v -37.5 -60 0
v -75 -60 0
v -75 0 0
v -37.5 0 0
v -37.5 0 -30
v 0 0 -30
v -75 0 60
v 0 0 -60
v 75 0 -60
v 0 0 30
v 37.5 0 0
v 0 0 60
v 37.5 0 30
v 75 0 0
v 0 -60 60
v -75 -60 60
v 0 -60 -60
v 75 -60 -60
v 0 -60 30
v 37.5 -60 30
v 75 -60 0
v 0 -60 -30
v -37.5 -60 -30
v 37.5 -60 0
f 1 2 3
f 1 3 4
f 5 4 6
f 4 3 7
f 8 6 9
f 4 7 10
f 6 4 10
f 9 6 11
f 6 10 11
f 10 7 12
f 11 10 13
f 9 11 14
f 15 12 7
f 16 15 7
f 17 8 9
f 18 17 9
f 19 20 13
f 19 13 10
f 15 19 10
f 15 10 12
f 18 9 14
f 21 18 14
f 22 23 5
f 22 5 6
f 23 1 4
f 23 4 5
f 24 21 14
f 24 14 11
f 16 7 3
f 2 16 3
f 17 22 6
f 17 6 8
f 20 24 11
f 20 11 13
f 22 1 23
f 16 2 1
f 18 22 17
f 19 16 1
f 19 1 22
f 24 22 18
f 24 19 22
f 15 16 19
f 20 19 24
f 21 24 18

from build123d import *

# Parameters (mm, degrees)
F0_W     = 37.5
F0_H     = 30
F1_DEPTH = 60


with BuildPart() as f1:
    # F0 (on Front) → F1 (new body)
    with BuildSketch(Plane.XZ):
        with Locations((-18.75, -15)):
            Rectangle(F0_W, F0_H)
        with Locations((-18.75, 15)):
            Rectangle(F0_W, F0_H)
        with Locations((18.75, 15)):
            Rectangle(F0_W, F0_H)
        with Locations((18.75, -15)):
            Rectangle(F0_W, F0_H)
        Polygon((-75, 0), (-37.5, 0), (-37.5, 30), (0, 30), (0, 60), (-75, 60), align=None)
        Polygon((75, 0), (37.5, 0), (37.5, -30), (0, -30), (0, -60), (75, -60), align=None)
    extrude(amount=F1_DEPTH)


solid = f1.part
